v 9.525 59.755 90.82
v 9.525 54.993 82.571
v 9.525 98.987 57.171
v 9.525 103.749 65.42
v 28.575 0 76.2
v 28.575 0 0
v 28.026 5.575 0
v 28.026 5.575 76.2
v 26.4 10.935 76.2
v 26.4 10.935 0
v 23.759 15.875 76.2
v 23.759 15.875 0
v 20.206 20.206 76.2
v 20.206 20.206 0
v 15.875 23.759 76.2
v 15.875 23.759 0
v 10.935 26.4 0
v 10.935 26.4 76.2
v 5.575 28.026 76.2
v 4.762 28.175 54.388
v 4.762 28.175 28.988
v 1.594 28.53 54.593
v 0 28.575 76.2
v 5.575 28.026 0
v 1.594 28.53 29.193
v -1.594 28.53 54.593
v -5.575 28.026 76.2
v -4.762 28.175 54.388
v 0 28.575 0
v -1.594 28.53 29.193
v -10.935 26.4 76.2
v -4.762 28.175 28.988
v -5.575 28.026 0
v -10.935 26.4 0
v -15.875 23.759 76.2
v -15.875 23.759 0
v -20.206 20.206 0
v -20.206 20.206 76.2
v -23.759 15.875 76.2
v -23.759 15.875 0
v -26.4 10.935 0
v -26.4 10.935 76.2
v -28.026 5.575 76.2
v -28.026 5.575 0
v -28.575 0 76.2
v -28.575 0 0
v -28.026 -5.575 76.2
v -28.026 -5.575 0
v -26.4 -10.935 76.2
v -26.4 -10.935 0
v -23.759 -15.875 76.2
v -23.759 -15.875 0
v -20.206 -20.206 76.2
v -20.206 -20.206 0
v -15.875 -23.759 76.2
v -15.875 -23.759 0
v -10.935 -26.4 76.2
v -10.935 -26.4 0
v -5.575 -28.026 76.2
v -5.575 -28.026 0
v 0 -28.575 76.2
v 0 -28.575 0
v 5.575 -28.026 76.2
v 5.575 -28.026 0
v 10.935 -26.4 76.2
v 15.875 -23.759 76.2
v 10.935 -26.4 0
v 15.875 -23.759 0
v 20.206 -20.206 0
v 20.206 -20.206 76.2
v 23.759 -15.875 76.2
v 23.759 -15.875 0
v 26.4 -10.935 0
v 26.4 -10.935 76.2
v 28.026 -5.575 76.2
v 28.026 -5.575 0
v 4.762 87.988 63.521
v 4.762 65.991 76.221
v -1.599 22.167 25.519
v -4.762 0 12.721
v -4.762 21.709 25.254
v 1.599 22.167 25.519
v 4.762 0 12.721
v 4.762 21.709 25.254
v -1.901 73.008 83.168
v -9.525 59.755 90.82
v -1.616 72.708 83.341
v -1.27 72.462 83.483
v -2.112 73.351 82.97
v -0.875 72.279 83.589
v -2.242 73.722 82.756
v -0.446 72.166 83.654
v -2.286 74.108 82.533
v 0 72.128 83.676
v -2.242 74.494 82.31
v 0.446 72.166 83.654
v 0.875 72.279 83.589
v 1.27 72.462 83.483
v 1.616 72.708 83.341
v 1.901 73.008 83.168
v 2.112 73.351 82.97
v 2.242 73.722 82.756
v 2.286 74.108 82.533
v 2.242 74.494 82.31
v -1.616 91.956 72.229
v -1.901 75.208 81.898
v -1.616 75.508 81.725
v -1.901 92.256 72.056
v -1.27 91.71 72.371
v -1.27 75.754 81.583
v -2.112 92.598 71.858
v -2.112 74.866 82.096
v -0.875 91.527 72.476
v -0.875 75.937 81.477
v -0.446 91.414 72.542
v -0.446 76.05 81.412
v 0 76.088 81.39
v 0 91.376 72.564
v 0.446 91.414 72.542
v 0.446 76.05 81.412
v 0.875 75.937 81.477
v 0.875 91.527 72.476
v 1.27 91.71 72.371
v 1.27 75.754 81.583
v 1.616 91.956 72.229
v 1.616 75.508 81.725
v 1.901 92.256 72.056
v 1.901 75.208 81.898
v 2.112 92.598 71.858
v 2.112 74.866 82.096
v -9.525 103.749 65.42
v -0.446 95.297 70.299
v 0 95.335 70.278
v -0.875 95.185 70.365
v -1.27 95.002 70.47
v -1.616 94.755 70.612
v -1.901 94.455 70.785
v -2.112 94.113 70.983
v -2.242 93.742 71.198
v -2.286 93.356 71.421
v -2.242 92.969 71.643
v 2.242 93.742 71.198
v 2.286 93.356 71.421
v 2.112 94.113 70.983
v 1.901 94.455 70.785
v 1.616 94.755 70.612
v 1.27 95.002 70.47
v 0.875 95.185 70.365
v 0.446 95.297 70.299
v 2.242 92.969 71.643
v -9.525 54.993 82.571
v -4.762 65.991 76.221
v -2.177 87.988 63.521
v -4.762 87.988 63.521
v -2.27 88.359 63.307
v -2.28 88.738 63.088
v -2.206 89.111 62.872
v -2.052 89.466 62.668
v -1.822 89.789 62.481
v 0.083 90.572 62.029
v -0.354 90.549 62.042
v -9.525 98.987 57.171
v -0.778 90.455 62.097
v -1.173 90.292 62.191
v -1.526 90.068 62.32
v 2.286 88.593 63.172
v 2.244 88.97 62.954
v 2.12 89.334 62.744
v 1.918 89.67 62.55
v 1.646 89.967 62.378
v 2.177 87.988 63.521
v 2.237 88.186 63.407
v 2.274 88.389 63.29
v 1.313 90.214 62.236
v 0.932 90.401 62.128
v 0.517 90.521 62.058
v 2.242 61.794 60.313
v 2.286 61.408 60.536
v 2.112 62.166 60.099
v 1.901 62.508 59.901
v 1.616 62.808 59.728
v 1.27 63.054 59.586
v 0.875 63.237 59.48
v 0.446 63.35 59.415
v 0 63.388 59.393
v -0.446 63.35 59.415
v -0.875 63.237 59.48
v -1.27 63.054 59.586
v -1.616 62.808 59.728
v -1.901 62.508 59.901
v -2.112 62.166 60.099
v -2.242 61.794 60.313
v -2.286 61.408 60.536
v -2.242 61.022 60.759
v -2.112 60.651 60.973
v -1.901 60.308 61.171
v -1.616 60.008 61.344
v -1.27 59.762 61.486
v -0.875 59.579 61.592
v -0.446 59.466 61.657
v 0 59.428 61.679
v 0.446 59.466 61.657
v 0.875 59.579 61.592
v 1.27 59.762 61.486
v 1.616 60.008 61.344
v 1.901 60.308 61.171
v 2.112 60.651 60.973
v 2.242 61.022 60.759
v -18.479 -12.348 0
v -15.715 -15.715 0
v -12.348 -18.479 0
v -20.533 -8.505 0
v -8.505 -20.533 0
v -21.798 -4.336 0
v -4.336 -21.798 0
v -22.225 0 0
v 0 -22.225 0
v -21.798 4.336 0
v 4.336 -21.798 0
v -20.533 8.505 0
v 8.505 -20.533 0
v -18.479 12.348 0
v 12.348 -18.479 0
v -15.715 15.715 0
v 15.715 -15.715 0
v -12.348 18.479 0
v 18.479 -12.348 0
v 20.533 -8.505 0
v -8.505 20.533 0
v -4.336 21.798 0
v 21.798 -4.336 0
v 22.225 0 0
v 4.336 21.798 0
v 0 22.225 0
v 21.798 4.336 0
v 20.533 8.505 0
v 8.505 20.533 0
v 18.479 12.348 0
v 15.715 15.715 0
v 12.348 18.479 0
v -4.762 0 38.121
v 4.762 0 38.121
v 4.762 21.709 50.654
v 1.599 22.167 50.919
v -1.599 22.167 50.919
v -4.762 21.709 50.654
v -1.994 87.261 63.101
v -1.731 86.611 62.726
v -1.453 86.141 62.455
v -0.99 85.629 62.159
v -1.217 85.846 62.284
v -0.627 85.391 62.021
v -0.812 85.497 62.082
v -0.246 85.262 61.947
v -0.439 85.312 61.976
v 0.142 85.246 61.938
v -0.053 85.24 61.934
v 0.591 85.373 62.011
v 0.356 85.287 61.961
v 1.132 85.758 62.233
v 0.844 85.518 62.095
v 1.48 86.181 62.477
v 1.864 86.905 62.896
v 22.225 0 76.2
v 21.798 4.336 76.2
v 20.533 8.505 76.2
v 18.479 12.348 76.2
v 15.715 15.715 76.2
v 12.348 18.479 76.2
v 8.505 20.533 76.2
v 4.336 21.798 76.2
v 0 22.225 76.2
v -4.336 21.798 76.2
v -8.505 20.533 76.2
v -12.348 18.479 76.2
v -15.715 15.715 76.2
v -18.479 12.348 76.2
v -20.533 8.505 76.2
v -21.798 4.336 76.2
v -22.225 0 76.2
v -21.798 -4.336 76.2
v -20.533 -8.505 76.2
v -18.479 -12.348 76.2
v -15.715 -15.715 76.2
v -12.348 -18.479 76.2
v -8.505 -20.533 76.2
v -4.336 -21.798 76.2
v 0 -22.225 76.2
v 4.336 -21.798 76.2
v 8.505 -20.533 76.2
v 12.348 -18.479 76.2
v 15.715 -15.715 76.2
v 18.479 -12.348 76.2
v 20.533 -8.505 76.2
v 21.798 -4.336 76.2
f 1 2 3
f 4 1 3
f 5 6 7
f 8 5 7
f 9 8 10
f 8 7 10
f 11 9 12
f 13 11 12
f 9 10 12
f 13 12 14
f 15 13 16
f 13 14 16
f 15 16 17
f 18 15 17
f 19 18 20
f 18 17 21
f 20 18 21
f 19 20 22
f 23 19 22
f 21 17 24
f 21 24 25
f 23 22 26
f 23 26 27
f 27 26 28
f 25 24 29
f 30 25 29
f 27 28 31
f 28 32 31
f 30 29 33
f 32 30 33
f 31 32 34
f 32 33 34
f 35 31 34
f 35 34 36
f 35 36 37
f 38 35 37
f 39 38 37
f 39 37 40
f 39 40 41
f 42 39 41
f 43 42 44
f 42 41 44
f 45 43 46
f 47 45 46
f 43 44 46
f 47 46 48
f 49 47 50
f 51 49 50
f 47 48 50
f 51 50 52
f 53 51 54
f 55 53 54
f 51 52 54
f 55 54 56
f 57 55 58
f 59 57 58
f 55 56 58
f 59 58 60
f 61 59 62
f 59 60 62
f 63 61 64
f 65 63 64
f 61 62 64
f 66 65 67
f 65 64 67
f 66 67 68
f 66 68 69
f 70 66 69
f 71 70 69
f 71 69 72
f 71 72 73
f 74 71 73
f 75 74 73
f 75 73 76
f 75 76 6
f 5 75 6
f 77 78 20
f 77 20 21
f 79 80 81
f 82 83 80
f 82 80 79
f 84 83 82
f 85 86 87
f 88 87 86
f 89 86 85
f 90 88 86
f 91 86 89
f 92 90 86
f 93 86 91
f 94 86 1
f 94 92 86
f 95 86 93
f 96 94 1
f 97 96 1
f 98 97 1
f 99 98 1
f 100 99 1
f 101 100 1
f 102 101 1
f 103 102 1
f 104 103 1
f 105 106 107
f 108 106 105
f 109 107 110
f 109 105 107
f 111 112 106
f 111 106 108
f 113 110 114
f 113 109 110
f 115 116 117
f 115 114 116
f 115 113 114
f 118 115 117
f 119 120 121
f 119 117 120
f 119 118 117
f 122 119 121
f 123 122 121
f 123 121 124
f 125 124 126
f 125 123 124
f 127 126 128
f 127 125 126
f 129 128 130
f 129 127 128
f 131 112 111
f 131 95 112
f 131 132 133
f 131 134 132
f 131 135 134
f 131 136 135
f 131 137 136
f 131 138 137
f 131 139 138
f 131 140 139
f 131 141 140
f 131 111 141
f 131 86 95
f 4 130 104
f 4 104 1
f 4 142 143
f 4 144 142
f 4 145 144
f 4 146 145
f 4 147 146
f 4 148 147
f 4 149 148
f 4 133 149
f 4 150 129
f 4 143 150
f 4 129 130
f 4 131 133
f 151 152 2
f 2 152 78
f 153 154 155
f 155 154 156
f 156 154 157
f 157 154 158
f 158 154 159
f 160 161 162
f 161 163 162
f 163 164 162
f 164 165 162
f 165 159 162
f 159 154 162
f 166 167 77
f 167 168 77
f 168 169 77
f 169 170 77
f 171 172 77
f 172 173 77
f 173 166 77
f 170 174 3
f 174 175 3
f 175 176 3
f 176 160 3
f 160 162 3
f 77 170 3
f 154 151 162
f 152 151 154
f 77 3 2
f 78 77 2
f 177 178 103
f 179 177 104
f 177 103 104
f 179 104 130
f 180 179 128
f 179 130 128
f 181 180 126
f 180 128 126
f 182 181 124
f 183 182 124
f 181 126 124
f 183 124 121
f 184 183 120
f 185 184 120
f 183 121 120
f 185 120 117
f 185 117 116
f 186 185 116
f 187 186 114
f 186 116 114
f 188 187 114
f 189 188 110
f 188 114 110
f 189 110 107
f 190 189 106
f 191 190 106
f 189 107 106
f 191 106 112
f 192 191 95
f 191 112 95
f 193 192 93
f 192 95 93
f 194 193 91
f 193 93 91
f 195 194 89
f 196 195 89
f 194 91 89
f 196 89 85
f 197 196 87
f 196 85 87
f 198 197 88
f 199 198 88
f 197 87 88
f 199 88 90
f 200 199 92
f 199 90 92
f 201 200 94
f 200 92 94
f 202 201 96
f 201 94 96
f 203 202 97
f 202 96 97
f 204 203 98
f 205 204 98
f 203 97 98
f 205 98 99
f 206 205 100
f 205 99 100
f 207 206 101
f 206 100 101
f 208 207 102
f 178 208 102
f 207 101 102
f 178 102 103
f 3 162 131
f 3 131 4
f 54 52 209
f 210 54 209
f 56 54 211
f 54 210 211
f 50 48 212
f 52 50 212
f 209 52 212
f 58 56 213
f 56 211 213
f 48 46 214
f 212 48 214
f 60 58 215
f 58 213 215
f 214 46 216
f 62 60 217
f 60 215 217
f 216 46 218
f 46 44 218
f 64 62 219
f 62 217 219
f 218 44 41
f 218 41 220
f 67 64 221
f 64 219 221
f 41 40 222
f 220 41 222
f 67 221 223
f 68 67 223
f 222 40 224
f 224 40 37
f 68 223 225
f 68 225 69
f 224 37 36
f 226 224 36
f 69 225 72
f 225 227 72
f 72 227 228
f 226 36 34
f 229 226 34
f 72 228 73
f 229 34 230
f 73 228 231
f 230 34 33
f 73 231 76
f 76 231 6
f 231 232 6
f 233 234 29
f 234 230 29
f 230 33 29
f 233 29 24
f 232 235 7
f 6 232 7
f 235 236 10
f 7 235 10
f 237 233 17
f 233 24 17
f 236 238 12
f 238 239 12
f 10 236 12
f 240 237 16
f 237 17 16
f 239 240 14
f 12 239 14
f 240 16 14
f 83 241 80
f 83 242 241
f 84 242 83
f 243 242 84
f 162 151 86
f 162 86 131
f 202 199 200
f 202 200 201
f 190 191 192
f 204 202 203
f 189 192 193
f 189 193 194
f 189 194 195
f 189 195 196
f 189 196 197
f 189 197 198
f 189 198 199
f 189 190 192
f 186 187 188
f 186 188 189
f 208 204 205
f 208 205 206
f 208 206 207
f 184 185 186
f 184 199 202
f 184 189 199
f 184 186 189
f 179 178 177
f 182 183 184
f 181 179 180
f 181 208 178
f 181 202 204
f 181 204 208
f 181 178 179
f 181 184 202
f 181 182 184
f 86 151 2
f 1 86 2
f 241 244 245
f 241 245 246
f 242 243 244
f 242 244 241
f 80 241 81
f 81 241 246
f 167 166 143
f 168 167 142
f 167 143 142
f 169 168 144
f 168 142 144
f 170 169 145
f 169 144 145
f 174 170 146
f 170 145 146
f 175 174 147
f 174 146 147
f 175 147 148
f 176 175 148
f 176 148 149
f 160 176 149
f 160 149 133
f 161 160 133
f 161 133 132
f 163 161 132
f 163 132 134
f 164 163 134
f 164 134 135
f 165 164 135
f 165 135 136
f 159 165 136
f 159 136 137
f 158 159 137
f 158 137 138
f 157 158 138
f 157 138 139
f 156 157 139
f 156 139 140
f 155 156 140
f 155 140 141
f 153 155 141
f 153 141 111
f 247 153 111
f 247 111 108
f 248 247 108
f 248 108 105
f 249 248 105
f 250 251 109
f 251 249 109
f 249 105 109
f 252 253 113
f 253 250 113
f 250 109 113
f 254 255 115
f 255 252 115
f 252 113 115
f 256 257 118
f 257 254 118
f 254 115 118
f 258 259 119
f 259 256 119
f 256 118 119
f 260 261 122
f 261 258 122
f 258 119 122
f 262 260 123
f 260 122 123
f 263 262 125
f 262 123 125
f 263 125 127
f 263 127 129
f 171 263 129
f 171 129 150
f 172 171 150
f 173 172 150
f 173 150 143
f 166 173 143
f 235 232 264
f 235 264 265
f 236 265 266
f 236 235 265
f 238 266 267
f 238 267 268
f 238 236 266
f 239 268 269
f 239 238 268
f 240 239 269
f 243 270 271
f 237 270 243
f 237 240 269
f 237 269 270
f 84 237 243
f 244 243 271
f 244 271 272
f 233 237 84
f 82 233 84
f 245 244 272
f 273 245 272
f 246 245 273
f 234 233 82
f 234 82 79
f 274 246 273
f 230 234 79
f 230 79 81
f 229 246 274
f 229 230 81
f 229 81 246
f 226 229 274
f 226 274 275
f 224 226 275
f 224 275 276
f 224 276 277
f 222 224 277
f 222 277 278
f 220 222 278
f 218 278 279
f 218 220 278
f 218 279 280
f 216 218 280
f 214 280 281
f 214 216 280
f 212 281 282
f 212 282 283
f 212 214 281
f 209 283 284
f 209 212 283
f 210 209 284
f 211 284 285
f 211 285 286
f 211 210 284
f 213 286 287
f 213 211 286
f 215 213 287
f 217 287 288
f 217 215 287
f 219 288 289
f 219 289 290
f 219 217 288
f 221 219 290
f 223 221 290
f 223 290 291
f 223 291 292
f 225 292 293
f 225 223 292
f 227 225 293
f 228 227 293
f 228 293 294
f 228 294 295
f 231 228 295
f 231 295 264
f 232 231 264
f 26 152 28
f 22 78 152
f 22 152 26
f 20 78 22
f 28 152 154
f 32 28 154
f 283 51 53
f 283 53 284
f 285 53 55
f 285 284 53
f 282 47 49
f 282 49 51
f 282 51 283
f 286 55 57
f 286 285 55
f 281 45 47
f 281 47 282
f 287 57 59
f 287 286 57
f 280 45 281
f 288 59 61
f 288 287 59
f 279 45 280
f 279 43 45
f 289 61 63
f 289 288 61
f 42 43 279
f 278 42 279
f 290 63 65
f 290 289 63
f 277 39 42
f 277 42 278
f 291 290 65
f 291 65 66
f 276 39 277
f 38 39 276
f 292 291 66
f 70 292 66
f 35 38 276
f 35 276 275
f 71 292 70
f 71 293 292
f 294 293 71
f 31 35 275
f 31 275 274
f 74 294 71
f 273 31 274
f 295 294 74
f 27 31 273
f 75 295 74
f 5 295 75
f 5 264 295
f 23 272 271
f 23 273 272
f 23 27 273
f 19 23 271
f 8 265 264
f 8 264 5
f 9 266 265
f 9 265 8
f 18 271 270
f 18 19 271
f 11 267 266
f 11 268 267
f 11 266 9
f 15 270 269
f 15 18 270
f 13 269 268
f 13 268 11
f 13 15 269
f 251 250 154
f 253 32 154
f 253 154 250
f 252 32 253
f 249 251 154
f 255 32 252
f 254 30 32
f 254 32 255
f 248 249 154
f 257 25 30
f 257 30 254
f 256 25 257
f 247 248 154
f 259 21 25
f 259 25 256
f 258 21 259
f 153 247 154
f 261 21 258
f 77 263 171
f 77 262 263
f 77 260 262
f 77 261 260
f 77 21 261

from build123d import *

# Parameters (mm, degrees)
F0_R     = 28.575
F0_R_2   = 22.225
F1_DEPTH = 76.2
F3_DEPTH = 4.7625
F4_W     = 19.05
F4_H     = 50.8
F5_DEPTH = 9.525
F6_R     = 2.286
F7_DEPTH = 25.4


with BuildPart() as f1:
    # F0 (on Top) → F1 (new body)
    with BuildSketch(Plane.XY):
        Circle(F0_R)
        Circle(F0_R_2, mode=Mode.SUBTRACT)
    extrude(amount=F1_DEPTH)

    # F2 (on Right) → F3 (join, symmetric)
    with BuildSketch(Plane.YZ):
        Polygon((0, 38.120868), (0, 12.720868), (87.988181, 63.520868), (65.991136, 76.220868), align=None)
    extrude(amount=F3_DEPTH, both=True)

    # F4 (on face) → F5 (join)
    with BuildSketch(Plane(origin=(0, 49.502388, 85.740651), x_dir=(1, 0, 0), z_dir=(0, 0.5, 0.866025))):
        with Locations((0, 31.739566)):
            Rectangle(F4_W, F4_H)
    extrude(amount=F5_DEPTH)

    # F6 (on face) → F7 (cut)
    with BuildSketch(Plane(origin=(0, 54.264888, 93.989543), x_dir=(1, 0, 0), z_dir=(0, 0.5, 0.866025))):
        with Locations((0, 22.913066)):
            Circle(F6_R)
        with Locations((0, 45.138066)):
            Circle(F6_R)
    extrude(amount=-F7_DEPTH, mode=Mode.SUBTRACT)


solid = f1.part
